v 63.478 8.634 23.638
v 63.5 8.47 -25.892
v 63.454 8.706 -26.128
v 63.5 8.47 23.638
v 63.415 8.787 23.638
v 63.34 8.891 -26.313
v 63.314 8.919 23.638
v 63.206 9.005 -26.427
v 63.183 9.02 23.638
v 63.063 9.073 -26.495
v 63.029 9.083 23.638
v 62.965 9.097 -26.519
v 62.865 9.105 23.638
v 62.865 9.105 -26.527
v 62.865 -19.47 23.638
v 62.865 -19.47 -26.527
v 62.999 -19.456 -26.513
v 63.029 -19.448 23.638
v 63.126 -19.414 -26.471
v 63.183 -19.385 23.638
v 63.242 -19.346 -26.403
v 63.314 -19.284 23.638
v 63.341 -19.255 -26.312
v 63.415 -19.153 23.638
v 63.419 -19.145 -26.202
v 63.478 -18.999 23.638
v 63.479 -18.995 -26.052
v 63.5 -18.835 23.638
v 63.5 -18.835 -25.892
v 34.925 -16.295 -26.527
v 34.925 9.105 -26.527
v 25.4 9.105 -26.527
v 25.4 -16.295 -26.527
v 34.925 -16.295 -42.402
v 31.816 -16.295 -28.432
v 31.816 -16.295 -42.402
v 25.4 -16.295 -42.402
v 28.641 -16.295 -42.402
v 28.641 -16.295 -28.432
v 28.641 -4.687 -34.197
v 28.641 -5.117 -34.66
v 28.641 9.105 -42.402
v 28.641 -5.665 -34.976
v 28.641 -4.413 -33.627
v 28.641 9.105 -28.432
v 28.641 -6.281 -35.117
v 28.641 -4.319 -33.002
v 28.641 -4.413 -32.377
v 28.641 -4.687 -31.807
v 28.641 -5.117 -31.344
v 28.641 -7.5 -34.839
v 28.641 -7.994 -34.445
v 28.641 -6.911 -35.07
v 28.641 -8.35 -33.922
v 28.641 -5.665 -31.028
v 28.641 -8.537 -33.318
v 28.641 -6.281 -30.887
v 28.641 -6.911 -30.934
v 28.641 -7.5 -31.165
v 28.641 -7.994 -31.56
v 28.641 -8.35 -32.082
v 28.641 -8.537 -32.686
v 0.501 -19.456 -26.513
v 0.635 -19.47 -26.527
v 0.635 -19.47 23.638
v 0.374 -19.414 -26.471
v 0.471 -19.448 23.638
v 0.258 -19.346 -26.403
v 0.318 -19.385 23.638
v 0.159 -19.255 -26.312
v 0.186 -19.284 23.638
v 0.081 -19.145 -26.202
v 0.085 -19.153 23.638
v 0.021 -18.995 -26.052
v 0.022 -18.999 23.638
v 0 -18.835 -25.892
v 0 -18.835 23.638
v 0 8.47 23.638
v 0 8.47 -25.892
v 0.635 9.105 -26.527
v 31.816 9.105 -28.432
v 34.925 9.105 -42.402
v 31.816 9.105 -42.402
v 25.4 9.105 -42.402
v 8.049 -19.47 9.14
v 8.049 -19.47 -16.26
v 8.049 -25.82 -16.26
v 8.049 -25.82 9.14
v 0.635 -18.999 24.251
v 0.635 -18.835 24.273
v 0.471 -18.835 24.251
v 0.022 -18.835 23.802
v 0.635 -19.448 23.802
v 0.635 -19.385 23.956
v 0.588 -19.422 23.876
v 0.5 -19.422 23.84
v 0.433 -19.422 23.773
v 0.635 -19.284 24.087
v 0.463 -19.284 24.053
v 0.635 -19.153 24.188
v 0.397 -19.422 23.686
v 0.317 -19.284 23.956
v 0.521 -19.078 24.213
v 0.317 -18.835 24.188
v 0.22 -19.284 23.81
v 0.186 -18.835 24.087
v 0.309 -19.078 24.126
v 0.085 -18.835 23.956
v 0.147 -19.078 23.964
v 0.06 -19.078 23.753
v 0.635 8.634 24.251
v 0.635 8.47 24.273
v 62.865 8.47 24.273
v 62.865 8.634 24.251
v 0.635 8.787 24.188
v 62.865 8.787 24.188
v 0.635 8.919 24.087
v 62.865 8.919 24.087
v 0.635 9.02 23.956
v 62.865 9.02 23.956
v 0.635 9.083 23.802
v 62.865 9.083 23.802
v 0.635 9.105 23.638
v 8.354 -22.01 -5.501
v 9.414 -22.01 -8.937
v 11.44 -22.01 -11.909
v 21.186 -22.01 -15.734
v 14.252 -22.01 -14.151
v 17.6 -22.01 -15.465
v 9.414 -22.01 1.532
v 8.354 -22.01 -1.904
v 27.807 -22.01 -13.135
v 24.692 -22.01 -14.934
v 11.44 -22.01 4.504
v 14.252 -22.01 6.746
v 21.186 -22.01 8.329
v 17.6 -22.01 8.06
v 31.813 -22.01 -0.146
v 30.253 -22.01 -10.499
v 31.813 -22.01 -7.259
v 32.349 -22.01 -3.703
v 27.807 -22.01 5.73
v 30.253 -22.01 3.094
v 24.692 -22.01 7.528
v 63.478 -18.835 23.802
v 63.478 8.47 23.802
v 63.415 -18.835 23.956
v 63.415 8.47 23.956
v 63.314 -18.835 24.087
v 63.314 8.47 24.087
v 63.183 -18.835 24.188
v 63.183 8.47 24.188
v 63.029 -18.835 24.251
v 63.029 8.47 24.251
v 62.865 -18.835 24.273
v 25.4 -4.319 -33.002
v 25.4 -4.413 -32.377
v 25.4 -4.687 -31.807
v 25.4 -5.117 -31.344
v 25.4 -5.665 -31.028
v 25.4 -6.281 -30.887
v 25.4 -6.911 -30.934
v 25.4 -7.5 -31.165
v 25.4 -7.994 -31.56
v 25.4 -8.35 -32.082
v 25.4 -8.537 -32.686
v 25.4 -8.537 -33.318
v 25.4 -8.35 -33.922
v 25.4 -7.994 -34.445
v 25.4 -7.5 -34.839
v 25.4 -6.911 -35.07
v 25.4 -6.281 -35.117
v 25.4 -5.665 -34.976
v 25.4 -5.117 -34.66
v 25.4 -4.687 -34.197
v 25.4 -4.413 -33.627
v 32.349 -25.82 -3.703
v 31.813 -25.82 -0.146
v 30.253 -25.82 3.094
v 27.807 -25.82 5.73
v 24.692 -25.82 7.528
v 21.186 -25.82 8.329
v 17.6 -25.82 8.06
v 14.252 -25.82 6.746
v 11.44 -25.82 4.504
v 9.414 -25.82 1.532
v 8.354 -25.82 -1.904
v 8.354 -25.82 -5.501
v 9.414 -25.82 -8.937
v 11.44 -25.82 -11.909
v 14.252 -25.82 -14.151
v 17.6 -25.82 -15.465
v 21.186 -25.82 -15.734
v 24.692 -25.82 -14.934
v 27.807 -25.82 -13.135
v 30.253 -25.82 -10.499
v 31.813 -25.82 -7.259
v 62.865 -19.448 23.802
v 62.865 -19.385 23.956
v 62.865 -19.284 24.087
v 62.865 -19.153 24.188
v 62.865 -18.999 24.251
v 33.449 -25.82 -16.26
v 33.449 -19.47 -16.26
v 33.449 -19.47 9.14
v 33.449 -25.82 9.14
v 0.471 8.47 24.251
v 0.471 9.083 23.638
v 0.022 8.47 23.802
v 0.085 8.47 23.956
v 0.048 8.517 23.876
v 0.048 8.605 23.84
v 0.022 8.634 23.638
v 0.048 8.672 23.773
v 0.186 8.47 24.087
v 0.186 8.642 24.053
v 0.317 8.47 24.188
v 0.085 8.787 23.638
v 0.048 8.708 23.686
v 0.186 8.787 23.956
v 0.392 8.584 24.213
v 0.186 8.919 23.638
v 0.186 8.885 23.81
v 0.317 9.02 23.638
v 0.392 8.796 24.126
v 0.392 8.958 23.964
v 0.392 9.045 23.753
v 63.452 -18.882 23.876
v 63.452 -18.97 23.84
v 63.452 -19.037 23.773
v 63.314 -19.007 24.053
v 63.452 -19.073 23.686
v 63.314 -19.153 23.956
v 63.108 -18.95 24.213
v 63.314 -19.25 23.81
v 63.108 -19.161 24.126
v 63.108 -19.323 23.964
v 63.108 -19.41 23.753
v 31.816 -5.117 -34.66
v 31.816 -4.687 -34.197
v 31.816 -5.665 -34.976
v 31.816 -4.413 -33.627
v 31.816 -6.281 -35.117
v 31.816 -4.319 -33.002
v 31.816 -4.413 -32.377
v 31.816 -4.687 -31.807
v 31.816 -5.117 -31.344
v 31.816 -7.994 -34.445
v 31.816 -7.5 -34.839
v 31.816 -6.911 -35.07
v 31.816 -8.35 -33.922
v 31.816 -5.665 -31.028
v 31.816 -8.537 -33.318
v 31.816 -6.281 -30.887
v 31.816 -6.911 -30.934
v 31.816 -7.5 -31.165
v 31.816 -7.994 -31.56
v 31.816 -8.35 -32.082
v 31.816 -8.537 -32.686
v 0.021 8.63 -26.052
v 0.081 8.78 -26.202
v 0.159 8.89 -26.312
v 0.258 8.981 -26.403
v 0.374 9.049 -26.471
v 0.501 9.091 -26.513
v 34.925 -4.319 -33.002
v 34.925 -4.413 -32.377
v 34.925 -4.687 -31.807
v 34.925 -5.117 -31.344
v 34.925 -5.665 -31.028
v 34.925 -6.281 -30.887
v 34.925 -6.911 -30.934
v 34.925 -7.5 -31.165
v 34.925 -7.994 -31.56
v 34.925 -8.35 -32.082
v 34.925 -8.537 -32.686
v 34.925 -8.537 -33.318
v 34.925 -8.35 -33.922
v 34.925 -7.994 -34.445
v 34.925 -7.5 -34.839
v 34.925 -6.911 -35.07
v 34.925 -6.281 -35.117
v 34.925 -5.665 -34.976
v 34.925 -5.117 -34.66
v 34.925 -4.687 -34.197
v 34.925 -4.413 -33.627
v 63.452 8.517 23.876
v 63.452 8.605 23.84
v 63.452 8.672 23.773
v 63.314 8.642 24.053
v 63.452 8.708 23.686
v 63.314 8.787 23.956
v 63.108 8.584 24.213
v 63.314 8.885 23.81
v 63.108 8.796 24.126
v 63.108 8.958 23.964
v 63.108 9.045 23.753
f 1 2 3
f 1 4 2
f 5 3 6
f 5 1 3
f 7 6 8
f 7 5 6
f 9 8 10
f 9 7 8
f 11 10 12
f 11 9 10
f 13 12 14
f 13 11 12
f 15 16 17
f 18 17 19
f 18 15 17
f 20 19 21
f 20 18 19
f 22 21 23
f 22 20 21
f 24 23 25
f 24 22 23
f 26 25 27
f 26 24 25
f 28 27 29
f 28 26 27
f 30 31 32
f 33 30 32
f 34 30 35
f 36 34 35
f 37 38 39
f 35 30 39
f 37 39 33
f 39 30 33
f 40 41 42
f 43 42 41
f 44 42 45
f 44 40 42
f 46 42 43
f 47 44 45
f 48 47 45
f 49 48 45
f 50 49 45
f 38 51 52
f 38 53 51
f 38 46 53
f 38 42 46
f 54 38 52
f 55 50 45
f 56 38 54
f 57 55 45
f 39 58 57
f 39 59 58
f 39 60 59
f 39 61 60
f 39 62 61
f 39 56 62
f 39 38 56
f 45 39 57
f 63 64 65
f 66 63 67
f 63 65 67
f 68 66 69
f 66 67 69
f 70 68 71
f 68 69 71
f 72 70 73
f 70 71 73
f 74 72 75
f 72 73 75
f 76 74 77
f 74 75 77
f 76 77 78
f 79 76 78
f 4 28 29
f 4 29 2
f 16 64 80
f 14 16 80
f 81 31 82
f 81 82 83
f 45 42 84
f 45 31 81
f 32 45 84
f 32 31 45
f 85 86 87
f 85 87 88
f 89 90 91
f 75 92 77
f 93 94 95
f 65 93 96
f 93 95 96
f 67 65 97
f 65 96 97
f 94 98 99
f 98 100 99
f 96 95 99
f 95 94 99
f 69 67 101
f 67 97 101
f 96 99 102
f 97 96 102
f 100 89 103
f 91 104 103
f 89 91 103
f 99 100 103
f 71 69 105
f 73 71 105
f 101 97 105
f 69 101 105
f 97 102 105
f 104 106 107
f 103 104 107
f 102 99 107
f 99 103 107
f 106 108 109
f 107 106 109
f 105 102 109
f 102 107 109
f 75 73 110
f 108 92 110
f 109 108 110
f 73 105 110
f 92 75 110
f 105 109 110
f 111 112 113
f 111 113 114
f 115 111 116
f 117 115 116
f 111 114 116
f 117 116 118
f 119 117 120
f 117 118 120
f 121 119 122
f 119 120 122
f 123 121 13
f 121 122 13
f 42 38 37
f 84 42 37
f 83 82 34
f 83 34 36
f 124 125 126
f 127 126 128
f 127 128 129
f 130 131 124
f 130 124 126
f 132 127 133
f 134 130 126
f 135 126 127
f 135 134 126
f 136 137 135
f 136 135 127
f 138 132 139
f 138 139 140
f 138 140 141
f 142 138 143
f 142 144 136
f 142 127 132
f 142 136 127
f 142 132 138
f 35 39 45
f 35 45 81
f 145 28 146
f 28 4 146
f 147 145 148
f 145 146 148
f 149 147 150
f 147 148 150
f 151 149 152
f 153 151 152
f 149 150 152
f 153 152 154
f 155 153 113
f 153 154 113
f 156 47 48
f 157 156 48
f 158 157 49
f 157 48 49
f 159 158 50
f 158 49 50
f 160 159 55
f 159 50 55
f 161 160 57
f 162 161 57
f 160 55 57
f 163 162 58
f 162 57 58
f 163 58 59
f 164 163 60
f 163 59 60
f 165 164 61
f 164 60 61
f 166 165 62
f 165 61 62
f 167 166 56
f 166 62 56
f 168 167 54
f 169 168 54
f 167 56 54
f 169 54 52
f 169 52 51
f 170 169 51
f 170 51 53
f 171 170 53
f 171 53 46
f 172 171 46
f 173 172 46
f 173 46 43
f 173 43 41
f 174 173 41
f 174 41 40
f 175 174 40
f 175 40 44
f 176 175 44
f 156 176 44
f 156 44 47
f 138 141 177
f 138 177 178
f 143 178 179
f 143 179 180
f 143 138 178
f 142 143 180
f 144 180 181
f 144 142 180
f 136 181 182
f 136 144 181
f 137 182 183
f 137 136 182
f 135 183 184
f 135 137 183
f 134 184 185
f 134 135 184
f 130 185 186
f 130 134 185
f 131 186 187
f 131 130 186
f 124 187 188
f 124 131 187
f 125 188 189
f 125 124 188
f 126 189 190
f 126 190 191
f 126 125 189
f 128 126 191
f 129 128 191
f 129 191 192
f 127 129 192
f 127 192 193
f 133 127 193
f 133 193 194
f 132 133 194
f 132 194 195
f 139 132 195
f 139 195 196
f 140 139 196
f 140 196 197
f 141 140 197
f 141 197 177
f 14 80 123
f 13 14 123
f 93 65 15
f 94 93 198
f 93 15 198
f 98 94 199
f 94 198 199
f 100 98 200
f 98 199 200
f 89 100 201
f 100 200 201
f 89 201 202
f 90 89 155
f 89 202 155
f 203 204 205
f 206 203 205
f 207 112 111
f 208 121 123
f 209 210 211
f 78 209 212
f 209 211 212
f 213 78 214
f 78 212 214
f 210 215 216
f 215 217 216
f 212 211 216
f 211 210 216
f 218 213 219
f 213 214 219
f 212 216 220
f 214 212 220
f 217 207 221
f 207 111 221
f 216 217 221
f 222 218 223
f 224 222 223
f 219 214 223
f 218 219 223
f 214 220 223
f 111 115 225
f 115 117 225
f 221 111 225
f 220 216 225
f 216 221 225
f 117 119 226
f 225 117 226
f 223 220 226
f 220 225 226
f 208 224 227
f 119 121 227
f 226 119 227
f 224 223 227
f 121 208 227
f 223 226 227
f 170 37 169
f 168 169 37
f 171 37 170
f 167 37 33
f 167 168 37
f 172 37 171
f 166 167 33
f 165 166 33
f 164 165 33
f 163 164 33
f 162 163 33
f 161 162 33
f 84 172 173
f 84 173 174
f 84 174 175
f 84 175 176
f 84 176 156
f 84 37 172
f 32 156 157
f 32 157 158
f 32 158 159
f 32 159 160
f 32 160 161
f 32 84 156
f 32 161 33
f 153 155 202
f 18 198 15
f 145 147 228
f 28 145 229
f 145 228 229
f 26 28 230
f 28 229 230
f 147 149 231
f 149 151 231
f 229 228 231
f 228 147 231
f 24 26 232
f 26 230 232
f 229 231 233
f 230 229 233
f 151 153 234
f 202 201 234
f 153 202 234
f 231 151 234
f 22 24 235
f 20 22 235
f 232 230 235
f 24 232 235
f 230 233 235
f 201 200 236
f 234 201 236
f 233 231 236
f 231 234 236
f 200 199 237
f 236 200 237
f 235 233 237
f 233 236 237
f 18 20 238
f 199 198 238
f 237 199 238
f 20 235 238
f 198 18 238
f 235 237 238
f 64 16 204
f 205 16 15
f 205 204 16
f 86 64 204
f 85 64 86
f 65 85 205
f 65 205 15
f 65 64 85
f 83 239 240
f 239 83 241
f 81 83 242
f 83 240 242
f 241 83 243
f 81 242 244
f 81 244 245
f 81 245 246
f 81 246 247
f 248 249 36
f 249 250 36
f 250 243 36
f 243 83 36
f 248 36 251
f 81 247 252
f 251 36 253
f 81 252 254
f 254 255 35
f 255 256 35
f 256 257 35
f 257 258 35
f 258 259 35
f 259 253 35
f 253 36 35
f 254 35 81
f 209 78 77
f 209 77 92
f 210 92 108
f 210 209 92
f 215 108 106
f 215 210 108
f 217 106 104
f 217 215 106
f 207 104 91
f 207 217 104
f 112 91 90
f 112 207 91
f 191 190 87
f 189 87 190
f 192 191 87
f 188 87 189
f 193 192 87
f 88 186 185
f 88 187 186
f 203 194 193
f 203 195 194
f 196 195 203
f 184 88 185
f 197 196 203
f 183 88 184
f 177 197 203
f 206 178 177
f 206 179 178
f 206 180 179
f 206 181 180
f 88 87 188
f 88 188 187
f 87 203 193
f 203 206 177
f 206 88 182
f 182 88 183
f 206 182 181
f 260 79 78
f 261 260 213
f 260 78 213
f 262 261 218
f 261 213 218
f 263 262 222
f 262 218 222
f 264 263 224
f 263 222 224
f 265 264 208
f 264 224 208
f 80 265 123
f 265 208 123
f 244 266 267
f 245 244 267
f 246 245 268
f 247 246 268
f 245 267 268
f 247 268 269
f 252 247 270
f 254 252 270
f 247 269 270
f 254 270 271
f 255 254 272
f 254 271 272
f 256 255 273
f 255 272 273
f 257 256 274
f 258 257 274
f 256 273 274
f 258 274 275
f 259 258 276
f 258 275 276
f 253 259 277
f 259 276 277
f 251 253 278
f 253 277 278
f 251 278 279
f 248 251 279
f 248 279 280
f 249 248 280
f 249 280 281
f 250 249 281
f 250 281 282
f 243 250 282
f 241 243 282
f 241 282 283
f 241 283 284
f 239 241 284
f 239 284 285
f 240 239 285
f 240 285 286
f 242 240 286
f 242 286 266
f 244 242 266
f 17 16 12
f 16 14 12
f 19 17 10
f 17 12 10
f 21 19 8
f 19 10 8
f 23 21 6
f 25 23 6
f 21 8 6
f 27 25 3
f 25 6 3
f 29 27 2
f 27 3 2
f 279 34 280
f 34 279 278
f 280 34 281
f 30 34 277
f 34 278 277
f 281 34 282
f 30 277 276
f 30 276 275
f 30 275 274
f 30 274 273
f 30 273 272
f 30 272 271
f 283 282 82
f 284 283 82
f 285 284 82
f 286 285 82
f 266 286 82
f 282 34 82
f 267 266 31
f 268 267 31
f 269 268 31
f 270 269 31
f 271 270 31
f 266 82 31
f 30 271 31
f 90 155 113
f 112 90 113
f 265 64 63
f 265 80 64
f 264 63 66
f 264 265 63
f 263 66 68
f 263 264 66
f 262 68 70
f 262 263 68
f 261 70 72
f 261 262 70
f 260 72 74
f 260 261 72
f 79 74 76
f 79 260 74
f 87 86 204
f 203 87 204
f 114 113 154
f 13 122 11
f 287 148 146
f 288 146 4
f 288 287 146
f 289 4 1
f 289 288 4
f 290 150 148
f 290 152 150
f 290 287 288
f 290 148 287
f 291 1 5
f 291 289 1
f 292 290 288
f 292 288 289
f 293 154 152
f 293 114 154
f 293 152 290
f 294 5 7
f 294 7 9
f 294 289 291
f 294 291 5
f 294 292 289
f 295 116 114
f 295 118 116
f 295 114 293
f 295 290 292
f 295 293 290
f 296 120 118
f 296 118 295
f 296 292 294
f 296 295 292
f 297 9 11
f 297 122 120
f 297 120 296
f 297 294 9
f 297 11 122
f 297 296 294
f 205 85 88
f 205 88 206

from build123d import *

# Parameters (mm, degrees)
F0_W      = 28.575
F0_H      = 50.8
F1_DEPTH  = 63.5
F2_W      = 9.525
F2_H      = 15.875
F3_DEPTH  = 25.4
F4_R      = 2.1209
F5_DEPTH  = 25.4
F6_W      = 25.4
F6_H      = 25.4
F6_R      = 12.065
F7_DEPTH  = 6.35
F7_FACE_R = 12.065
F8_DEPTH  = 2.54
F9_W      = 3.175
F9_H      = 13.97
F10_DEPTH = 25.4
F11_R     = 0.635


with BuildPart() as f1:
    # F0 (on Right) → F1 (new body)
    with BuildSketch(Plane.YZ):
        with Locations((-5.182586, -1.126902)):
            Rectangle(F0_W, F0_H)
    extrude(amount=F1_DEPTH)

    # F6 (on face) → F7 (join)
    with BuildSketch(Plane.XZ.offset(19.470086)):
        with Locations((20.749297, -3.559577)):
            Rectangle(F6_W, F6_H)
        with Locations((20.284224, -3.702676)):
            Circle(F6_R, mode=Mode.SUBTRACT)
    extrude(amount=F7_DEPTH)

    # F7_face (on face) → F8 (join)
    with BuildSketch(Plane(origin=(20.284224, -19.470086, -3.702676), x_dir=(1, 0, 0), z_dir=(0, -1, 0))):
        Circle(F7_FACE_R)
    extrude(amount=F8_DEPTH)

    # F11
    f11_edges = [f1.edges().sort_by_distance(p)[0] for p in [
        (31.75, 9.104914, 24.273098),
        (0, -5.182586, 24.273098),
        (31.75, -19.470086, 24.273098),
        (63.5, -5.182586, 24.273098),
        (0, -19.470086, -1.126902),
        (0, -5.182586, -26.526902),
        (0, 9.104914, -1.126902),
        (63.5, -19.470086, -1.126902),
        (63.5, 9.104914, -1.126902),
        (63.5, -5.182586, -26.526902),
    ]]
    fillet(f11_edges, radius=F11_R)


with BuildPart() as f3:
    # F2 (on face) → F3 (new body)
    with BuildSketch(Plane(origin=(0, 9.104914, 0), x_dir=(-1, 0, 0), z_dir=(0, 1, 0))):
        with Locations((-30.1625, -34.464402)):
            Rectangle(F2_W, F2_H)
    extrude(amount=-F3_DEPTH)

    # F4 (on face) → F5 (cut)
    with BuildSketch(Plane.YZ.offset(34.925)):
        with Locations((-6.439436, -33.002112)):
            Circle(F4_R)
    extrude(amount=-F5_DEPTH, mode=Mode.SUBTRACT)

    # F9 (on face) → F10 (cut)
    with BuildSketch(Plane.XZ.offset(16.295086)):
        with Locations((30.228879, -35.416902)):
            Rectangle(F9_W, F9_H)
    extrude(amount=-F10_DEPTH, mode=Mode.SUBTRACT)


solid = Compound([f1.part, f3.part])
